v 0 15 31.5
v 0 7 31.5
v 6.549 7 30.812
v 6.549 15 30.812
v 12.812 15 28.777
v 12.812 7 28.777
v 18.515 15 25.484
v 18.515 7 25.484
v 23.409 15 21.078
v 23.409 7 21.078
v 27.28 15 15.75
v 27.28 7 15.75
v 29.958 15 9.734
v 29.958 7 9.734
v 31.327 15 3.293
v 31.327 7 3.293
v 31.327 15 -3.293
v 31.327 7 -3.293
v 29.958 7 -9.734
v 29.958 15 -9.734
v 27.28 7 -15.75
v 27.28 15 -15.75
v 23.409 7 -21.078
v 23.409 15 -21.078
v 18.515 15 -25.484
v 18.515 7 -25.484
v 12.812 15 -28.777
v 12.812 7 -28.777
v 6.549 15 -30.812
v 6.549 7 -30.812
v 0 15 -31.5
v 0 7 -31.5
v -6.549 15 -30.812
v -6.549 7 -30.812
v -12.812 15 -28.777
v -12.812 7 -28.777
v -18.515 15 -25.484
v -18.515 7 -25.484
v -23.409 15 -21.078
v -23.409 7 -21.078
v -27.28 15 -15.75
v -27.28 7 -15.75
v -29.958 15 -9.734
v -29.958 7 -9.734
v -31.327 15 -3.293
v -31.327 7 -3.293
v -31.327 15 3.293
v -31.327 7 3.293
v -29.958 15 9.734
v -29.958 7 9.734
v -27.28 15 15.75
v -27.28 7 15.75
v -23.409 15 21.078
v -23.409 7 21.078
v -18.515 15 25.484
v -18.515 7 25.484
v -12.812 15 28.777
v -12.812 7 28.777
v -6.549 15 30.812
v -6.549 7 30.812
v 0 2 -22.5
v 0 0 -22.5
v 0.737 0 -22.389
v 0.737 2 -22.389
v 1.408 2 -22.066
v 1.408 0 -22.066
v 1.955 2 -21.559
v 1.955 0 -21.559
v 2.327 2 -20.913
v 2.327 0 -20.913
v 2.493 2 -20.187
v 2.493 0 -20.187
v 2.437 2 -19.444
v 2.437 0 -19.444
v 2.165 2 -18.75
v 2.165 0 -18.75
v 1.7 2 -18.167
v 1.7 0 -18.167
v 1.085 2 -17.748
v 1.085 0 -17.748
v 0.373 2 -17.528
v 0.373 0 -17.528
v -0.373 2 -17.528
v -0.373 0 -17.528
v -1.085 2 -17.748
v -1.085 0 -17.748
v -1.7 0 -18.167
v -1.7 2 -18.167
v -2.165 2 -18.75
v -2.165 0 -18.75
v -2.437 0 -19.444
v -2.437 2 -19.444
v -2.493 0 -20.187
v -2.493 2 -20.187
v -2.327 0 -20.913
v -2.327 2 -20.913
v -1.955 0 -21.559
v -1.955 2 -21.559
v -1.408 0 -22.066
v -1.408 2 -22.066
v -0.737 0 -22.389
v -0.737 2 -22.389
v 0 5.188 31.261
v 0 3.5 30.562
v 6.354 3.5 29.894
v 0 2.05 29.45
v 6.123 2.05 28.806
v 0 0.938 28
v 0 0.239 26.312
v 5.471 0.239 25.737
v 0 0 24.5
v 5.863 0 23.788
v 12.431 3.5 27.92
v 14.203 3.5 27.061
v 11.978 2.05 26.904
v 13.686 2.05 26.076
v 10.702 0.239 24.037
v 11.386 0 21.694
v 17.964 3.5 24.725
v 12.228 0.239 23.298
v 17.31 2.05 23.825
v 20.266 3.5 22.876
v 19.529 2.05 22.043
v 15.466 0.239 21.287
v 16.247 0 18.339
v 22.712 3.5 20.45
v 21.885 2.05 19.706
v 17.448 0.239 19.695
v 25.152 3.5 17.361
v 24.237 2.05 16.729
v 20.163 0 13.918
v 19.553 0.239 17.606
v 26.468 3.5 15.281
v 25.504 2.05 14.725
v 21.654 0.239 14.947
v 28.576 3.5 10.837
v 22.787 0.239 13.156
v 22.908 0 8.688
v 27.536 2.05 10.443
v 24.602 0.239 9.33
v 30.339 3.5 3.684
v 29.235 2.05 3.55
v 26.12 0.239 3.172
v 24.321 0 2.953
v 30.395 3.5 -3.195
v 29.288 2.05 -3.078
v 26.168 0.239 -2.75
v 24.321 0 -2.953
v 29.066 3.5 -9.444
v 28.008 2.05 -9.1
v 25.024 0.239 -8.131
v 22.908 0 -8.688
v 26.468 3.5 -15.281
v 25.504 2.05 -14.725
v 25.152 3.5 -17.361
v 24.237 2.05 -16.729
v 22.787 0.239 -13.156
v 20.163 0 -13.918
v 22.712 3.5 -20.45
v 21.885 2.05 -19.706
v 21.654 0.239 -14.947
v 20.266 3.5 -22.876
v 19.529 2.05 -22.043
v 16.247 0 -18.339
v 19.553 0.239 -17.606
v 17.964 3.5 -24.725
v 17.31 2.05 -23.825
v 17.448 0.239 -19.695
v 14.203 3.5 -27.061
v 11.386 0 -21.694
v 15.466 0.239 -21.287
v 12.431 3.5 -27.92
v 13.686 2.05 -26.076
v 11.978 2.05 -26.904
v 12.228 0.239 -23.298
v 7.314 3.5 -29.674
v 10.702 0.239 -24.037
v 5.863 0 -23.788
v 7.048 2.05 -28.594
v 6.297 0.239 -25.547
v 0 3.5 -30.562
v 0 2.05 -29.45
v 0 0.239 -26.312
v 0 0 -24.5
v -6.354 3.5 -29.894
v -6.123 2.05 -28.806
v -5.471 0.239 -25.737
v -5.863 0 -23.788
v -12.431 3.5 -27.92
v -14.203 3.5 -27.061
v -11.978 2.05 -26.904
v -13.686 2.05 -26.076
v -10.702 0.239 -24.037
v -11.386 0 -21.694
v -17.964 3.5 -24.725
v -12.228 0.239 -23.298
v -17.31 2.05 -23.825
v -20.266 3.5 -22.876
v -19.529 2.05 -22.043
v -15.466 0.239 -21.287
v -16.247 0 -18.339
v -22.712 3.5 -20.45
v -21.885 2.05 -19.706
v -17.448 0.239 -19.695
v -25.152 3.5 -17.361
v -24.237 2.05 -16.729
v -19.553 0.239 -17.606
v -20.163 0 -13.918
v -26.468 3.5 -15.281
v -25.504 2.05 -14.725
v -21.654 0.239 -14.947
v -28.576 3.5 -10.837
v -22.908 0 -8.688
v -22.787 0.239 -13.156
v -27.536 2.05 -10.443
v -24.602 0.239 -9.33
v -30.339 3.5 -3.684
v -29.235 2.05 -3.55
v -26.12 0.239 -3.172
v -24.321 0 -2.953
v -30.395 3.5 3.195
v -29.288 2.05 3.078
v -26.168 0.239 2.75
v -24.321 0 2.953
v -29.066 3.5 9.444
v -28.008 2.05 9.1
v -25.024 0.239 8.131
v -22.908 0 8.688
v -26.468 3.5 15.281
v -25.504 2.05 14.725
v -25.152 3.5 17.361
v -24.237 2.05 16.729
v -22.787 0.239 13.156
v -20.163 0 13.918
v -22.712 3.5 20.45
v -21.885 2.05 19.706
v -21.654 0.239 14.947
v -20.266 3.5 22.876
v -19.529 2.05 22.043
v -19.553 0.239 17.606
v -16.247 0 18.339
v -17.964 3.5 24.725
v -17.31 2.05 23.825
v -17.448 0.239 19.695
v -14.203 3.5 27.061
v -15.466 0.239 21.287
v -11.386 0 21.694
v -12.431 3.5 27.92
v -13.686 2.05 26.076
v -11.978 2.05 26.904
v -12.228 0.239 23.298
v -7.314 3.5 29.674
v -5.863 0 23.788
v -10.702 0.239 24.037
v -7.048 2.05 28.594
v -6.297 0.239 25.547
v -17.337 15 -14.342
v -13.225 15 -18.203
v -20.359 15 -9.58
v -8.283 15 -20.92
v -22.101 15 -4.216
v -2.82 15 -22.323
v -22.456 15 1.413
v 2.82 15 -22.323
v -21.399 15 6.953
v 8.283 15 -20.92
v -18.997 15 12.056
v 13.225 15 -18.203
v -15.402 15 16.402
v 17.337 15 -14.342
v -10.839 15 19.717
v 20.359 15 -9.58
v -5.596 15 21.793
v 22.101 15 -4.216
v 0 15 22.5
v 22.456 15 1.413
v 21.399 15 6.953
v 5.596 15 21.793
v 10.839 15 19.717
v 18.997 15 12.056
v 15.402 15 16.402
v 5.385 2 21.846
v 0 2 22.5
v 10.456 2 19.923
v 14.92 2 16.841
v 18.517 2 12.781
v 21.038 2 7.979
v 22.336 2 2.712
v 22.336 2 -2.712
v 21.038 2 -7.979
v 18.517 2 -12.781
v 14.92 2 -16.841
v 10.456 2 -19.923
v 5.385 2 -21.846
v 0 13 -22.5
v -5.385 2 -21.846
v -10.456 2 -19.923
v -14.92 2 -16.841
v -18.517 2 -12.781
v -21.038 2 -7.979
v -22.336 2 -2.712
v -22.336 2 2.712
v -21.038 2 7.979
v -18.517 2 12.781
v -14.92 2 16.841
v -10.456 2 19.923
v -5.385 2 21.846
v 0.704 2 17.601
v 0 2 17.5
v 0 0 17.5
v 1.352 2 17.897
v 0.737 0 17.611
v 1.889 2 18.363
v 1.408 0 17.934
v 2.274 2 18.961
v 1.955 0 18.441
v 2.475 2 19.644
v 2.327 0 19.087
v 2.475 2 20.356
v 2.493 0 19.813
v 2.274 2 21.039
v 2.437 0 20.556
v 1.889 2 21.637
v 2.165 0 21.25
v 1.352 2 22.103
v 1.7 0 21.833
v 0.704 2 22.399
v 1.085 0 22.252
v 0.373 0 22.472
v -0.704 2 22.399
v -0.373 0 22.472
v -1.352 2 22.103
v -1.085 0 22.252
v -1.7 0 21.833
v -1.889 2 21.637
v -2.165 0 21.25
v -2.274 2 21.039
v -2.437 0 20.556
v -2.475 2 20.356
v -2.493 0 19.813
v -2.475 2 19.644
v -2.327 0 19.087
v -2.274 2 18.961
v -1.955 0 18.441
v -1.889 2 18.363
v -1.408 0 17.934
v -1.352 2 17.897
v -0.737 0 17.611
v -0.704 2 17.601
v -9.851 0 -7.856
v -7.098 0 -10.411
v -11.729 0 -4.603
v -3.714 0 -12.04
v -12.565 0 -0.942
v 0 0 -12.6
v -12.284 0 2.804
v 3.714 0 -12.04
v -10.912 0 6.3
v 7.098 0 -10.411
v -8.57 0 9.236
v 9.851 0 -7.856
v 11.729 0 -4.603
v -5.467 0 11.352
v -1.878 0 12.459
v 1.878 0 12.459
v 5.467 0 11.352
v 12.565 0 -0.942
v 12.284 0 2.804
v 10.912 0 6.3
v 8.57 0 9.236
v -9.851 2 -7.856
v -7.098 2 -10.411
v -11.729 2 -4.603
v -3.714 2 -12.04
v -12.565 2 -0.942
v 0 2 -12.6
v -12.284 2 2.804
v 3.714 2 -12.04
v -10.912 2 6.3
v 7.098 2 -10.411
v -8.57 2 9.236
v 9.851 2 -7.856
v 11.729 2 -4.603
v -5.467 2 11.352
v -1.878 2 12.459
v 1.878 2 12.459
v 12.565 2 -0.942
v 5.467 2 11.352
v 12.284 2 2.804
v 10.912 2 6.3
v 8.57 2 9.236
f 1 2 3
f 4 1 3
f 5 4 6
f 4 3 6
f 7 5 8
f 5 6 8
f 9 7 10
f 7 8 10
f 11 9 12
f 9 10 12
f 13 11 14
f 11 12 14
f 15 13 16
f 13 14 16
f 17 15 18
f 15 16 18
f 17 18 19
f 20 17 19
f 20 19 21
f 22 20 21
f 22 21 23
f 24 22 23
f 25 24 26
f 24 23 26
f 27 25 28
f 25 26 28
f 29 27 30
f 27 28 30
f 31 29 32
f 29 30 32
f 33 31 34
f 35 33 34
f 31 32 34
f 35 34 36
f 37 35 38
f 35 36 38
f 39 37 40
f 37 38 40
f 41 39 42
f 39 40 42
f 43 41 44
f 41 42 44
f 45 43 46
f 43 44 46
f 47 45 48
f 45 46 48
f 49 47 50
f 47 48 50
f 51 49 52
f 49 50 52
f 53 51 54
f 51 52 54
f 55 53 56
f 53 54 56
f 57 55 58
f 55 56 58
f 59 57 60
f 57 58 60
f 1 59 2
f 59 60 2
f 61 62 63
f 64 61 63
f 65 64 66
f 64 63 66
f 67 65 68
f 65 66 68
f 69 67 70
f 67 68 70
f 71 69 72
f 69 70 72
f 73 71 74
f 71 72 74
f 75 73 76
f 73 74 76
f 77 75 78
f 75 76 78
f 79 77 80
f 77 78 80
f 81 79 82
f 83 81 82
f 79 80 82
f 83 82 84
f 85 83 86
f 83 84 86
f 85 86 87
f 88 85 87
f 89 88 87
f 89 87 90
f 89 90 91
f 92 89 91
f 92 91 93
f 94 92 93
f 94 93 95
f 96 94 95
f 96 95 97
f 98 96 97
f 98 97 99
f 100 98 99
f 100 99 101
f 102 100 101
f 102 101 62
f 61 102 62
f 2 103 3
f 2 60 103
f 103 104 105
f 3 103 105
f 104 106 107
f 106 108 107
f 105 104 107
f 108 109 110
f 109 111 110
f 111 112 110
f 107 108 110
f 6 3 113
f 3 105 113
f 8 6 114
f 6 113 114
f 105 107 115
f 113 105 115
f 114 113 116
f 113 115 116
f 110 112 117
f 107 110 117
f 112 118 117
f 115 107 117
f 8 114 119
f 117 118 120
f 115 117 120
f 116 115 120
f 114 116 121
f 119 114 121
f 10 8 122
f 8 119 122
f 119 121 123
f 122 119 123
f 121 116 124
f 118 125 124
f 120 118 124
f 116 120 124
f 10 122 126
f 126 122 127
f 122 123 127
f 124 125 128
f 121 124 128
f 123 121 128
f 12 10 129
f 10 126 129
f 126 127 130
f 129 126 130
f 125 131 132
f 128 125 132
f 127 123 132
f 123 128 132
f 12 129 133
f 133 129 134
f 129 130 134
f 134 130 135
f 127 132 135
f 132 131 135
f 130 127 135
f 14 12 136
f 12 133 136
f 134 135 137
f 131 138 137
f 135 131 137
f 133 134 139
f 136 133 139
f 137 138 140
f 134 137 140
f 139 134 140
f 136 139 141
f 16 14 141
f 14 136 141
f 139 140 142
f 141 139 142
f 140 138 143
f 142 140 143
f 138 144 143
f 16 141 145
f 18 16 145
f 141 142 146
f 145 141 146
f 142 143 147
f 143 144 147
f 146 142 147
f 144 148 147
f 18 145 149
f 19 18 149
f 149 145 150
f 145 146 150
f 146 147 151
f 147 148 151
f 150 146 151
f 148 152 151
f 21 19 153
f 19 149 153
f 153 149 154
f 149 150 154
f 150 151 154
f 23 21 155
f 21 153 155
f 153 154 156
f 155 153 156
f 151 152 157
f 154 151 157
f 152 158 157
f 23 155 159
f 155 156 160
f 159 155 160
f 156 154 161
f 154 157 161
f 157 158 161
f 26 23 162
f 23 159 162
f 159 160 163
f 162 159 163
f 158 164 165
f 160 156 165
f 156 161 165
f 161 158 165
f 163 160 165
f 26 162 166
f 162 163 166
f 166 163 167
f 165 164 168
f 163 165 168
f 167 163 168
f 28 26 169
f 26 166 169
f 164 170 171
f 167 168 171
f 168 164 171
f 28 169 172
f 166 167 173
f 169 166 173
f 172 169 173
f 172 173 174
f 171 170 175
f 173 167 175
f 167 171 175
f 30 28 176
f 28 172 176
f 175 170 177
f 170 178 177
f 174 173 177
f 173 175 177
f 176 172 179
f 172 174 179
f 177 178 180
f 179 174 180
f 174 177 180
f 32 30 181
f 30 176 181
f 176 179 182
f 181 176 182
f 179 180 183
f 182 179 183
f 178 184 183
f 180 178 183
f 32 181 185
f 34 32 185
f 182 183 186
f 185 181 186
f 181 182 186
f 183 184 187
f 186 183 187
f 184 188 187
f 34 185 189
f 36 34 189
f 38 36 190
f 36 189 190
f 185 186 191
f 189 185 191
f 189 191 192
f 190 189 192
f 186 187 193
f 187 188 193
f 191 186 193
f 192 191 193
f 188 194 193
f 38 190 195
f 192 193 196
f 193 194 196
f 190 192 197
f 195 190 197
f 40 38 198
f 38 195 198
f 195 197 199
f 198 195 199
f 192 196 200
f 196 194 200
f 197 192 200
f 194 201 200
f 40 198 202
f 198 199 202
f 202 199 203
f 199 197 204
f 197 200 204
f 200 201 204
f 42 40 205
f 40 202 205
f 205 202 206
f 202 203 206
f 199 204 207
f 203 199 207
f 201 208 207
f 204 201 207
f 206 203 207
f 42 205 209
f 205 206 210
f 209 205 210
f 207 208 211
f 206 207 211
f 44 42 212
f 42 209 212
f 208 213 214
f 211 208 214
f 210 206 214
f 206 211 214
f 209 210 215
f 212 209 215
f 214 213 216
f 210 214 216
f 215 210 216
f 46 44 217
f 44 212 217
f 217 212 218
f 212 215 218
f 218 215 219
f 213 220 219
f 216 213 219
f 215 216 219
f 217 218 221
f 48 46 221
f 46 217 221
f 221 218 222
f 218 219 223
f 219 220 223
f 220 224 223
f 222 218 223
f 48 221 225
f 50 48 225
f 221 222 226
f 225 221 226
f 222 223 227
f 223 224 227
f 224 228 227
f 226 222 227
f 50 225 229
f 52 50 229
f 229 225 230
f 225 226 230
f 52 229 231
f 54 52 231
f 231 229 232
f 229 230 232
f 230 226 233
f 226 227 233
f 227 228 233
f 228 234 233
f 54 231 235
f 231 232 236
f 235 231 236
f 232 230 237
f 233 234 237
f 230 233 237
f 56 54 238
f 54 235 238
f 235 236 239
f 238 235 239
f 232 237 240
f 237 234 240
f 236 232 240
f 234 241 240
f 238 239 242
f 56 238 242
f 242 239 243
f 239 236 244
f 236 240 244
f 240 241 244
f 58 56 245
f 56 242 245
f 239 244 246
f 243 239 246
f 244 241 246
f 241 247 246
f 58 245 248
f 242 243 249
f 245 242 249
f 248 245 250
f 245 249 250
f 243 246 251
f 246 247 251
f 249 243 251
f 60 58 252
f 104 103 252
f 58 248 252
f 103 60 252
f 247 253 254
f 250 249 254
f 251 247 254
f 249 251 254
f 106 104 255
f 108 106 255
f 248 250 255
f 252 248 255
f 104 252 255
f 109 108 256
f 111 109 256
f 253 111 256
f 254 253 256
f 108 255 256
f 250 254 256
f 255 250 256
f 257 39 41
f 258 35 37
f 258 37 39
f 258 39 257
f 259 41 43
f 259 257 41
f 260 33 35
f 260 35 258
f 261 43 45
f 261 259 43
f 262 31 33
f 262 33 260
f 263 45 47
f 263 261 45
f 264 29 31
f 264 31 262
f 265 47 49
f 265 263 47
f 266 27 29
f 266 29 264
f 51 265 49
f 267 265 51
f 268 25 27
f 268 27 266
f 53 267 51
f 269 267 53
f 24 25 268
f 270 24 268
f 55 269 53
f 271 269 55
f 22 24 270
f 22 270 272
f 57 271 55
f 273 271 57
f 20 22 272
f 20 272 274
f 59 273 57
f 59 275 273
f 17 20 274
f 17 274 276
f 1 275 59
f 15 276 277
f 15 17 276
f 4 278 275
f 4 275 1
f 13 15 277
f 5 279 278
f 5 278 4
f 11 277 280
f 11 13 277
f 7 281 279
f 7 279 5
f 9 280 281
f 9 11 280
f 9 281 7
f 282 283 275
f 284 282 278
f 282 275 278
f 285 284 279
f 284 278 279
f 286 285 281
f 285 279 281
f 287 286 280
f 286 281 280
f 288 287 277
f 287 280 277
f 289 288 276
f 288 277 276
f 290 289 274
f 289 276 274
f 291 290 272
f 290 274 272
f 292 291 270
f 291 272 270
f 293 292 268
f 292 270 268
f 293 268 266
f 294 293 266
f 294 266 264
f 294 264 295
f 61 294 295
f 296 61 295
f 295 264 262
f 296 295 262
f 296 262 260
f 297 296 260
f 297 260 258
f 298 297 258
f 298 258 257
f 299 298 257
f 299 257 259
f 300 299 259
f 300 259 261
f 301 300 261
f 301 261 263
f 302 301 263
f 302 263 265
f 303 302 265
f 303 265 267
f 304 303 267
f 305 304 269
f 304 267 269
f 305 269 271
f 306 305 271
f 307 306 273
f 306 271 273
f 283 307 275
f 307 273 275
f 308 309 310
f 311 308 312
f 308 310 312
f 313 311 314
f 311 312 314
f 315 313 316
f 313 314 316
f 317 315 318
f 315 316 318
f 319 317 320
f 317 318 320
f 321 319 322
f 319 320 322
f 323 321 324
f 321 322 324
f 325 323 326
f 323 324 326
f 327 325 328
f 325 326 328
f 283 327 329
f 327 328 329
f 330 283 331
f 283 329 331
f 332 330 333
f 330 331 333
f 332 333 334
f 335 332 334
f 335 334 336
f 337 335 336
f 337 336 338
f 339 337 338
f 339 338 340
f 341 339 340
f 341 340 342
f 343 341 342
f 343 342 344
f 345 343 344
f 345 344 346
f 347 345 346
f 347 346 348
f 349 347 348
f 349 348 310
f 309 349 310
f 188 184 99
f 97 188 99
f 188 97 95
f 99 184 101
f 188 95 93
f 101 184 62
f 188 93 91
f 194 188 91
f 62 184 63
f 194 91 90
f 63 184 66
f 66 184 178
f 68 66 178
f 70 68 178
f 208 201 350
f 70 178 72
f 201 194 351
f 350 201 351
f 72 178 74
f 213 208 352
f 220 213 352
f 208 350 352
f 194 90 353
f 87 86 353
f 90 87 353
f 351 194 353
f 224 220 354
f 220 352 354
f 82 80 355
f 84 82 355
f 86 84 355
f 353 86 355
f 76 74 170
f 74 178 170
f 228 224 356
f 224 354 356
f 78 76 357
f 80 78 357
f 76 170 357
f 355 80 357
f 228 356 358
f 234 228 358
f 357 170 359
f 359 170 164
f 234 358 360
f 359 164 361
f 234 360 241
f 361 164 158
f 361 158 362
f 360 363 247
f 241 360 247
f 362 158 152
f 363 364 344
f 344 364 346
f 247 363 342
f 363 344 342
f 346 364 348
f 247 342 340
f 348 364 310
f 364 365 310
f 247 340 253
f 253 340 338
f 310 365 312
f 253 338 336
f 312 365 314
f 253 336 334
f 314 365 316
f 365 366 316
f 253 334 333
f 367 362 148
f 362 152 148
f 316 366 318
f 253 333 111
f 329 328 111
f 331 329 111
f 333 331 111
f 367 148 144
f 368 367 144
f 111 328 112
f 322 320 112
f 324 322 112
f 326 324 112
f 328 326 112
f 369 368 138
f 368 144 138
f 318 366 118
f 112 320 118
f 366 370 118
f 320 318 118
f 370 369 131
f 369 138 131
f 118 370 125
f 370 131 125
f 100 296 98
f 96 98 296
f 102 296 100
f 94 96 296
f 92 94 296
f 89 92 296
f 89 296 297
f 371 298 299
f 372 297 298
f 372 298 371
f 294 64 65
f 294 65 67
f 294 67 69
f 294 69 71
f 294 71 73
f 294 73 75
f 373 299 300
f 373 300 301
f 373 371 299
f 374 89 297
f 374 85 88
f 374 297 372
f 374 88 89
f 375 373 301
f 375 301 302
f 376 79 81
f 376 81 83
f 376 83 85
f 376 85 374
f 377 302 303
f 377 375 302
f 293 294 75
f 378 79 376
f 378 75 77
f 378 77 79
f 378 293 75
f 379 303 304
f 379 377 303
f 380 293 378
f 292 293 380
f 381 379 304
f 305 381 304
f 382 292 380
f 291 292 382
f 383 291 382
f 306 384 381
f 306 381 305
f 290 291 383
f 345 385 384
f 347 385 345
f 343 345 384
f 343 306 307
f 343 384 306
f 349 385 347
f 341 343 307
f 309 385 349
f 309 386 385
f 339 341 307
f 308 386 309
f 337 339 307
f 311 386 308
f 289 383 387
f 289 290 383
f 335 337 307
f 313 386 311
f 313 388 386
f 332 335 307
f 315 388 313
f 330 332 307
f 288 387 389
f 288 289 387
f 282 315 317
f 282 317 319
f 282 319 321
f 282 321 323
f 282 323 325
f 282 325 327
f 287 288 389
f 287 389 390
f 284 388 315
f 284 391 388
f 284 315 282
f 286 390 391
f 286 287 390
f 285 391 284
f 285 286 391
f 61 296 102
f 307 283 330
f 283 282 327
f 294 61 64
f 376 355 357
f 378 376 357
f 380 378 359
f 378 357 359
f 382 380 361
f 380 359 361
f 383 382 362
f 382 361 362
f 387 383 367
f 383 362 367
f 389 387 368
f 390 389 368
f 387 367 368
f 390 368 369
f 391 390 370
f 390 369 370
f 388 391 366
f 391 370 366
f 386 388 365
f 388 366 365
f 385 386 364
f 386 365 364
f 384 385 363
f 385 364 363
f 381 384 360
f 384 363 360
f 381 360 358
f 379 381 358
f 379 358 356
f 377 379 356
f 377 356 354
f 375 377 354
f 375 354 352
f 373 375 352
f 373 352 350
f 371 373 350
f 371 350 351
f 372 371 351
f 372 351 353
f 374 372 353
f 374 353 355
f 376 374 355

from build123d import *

# Parameters (mm, degrees)
SKETCH1_R           = 31.5
BOSS_EXTRUDE1_DEPTH = 15
SKETCH2_R           = 22.5
CUT_EXTRUDE1_DEPTH  = 13
SKETCH3_R           = 12.6
SKETCH3_R_2         = 2.5
CUT_EXTRUDE2_DEPTH  = 13
FILLET1_R           = 7


with BuildPart() as part:
    # Sketch1 → Boss-Extrude1 (new body)
    with BuildSketch(Plane(origin=(0, 0, 0), x_dir=(1, 0, 0), z_dir=(0, 1, 0))):
        with Locations(Location((0, 0, 0), (0, 0, 270))):
            Circle(SKETCH1_R)
    extrude(amount=BOSS_EXTRUDE1_DEPTH)

    # Sketch2 → Cut-Extrude1 (cut)
    with BuildSketch(Plane(origin=(0, 15, 0), x_dir=(1, 0, 0), z_dir=(0, 1, 0))):
        with Locations(Location((0, 0, 0), (0, 0, 270))):
            Circle(SKETCH2_R)
    extrude(amount=-CUT_EXTRUDE1_DEPTH, mode=Mode.SUBTRACT)

    # Sketch3 → Cut-Extrude2 (cut)
    with BuildSketch(Plane.XZ):
        with Locations(Location((0, 0, 0), (0, 0, 270))):
            Circle(SKETCH3_R)
        with Locations(Location((0, 20, 0), (0, 0, 270))):
            Circle(SKETCH3_R_2)
        with Locations(Location((0, -20, 0), (0, 0, 270))):
            Circle(SKETCH3_R_2)
    extrude(amount=-CUT_EXTRUDE2_DEPTH, mode=Mode.SUBTRACT)

    # Fillet1
    fillet1_edges = [part.edges().sort_by_distance(p)[0] for p in [
        (0, 0, -31.5),
    ]]
    fillet(fillet1_edges, radius=FILLET1_R)


solid = part.part
